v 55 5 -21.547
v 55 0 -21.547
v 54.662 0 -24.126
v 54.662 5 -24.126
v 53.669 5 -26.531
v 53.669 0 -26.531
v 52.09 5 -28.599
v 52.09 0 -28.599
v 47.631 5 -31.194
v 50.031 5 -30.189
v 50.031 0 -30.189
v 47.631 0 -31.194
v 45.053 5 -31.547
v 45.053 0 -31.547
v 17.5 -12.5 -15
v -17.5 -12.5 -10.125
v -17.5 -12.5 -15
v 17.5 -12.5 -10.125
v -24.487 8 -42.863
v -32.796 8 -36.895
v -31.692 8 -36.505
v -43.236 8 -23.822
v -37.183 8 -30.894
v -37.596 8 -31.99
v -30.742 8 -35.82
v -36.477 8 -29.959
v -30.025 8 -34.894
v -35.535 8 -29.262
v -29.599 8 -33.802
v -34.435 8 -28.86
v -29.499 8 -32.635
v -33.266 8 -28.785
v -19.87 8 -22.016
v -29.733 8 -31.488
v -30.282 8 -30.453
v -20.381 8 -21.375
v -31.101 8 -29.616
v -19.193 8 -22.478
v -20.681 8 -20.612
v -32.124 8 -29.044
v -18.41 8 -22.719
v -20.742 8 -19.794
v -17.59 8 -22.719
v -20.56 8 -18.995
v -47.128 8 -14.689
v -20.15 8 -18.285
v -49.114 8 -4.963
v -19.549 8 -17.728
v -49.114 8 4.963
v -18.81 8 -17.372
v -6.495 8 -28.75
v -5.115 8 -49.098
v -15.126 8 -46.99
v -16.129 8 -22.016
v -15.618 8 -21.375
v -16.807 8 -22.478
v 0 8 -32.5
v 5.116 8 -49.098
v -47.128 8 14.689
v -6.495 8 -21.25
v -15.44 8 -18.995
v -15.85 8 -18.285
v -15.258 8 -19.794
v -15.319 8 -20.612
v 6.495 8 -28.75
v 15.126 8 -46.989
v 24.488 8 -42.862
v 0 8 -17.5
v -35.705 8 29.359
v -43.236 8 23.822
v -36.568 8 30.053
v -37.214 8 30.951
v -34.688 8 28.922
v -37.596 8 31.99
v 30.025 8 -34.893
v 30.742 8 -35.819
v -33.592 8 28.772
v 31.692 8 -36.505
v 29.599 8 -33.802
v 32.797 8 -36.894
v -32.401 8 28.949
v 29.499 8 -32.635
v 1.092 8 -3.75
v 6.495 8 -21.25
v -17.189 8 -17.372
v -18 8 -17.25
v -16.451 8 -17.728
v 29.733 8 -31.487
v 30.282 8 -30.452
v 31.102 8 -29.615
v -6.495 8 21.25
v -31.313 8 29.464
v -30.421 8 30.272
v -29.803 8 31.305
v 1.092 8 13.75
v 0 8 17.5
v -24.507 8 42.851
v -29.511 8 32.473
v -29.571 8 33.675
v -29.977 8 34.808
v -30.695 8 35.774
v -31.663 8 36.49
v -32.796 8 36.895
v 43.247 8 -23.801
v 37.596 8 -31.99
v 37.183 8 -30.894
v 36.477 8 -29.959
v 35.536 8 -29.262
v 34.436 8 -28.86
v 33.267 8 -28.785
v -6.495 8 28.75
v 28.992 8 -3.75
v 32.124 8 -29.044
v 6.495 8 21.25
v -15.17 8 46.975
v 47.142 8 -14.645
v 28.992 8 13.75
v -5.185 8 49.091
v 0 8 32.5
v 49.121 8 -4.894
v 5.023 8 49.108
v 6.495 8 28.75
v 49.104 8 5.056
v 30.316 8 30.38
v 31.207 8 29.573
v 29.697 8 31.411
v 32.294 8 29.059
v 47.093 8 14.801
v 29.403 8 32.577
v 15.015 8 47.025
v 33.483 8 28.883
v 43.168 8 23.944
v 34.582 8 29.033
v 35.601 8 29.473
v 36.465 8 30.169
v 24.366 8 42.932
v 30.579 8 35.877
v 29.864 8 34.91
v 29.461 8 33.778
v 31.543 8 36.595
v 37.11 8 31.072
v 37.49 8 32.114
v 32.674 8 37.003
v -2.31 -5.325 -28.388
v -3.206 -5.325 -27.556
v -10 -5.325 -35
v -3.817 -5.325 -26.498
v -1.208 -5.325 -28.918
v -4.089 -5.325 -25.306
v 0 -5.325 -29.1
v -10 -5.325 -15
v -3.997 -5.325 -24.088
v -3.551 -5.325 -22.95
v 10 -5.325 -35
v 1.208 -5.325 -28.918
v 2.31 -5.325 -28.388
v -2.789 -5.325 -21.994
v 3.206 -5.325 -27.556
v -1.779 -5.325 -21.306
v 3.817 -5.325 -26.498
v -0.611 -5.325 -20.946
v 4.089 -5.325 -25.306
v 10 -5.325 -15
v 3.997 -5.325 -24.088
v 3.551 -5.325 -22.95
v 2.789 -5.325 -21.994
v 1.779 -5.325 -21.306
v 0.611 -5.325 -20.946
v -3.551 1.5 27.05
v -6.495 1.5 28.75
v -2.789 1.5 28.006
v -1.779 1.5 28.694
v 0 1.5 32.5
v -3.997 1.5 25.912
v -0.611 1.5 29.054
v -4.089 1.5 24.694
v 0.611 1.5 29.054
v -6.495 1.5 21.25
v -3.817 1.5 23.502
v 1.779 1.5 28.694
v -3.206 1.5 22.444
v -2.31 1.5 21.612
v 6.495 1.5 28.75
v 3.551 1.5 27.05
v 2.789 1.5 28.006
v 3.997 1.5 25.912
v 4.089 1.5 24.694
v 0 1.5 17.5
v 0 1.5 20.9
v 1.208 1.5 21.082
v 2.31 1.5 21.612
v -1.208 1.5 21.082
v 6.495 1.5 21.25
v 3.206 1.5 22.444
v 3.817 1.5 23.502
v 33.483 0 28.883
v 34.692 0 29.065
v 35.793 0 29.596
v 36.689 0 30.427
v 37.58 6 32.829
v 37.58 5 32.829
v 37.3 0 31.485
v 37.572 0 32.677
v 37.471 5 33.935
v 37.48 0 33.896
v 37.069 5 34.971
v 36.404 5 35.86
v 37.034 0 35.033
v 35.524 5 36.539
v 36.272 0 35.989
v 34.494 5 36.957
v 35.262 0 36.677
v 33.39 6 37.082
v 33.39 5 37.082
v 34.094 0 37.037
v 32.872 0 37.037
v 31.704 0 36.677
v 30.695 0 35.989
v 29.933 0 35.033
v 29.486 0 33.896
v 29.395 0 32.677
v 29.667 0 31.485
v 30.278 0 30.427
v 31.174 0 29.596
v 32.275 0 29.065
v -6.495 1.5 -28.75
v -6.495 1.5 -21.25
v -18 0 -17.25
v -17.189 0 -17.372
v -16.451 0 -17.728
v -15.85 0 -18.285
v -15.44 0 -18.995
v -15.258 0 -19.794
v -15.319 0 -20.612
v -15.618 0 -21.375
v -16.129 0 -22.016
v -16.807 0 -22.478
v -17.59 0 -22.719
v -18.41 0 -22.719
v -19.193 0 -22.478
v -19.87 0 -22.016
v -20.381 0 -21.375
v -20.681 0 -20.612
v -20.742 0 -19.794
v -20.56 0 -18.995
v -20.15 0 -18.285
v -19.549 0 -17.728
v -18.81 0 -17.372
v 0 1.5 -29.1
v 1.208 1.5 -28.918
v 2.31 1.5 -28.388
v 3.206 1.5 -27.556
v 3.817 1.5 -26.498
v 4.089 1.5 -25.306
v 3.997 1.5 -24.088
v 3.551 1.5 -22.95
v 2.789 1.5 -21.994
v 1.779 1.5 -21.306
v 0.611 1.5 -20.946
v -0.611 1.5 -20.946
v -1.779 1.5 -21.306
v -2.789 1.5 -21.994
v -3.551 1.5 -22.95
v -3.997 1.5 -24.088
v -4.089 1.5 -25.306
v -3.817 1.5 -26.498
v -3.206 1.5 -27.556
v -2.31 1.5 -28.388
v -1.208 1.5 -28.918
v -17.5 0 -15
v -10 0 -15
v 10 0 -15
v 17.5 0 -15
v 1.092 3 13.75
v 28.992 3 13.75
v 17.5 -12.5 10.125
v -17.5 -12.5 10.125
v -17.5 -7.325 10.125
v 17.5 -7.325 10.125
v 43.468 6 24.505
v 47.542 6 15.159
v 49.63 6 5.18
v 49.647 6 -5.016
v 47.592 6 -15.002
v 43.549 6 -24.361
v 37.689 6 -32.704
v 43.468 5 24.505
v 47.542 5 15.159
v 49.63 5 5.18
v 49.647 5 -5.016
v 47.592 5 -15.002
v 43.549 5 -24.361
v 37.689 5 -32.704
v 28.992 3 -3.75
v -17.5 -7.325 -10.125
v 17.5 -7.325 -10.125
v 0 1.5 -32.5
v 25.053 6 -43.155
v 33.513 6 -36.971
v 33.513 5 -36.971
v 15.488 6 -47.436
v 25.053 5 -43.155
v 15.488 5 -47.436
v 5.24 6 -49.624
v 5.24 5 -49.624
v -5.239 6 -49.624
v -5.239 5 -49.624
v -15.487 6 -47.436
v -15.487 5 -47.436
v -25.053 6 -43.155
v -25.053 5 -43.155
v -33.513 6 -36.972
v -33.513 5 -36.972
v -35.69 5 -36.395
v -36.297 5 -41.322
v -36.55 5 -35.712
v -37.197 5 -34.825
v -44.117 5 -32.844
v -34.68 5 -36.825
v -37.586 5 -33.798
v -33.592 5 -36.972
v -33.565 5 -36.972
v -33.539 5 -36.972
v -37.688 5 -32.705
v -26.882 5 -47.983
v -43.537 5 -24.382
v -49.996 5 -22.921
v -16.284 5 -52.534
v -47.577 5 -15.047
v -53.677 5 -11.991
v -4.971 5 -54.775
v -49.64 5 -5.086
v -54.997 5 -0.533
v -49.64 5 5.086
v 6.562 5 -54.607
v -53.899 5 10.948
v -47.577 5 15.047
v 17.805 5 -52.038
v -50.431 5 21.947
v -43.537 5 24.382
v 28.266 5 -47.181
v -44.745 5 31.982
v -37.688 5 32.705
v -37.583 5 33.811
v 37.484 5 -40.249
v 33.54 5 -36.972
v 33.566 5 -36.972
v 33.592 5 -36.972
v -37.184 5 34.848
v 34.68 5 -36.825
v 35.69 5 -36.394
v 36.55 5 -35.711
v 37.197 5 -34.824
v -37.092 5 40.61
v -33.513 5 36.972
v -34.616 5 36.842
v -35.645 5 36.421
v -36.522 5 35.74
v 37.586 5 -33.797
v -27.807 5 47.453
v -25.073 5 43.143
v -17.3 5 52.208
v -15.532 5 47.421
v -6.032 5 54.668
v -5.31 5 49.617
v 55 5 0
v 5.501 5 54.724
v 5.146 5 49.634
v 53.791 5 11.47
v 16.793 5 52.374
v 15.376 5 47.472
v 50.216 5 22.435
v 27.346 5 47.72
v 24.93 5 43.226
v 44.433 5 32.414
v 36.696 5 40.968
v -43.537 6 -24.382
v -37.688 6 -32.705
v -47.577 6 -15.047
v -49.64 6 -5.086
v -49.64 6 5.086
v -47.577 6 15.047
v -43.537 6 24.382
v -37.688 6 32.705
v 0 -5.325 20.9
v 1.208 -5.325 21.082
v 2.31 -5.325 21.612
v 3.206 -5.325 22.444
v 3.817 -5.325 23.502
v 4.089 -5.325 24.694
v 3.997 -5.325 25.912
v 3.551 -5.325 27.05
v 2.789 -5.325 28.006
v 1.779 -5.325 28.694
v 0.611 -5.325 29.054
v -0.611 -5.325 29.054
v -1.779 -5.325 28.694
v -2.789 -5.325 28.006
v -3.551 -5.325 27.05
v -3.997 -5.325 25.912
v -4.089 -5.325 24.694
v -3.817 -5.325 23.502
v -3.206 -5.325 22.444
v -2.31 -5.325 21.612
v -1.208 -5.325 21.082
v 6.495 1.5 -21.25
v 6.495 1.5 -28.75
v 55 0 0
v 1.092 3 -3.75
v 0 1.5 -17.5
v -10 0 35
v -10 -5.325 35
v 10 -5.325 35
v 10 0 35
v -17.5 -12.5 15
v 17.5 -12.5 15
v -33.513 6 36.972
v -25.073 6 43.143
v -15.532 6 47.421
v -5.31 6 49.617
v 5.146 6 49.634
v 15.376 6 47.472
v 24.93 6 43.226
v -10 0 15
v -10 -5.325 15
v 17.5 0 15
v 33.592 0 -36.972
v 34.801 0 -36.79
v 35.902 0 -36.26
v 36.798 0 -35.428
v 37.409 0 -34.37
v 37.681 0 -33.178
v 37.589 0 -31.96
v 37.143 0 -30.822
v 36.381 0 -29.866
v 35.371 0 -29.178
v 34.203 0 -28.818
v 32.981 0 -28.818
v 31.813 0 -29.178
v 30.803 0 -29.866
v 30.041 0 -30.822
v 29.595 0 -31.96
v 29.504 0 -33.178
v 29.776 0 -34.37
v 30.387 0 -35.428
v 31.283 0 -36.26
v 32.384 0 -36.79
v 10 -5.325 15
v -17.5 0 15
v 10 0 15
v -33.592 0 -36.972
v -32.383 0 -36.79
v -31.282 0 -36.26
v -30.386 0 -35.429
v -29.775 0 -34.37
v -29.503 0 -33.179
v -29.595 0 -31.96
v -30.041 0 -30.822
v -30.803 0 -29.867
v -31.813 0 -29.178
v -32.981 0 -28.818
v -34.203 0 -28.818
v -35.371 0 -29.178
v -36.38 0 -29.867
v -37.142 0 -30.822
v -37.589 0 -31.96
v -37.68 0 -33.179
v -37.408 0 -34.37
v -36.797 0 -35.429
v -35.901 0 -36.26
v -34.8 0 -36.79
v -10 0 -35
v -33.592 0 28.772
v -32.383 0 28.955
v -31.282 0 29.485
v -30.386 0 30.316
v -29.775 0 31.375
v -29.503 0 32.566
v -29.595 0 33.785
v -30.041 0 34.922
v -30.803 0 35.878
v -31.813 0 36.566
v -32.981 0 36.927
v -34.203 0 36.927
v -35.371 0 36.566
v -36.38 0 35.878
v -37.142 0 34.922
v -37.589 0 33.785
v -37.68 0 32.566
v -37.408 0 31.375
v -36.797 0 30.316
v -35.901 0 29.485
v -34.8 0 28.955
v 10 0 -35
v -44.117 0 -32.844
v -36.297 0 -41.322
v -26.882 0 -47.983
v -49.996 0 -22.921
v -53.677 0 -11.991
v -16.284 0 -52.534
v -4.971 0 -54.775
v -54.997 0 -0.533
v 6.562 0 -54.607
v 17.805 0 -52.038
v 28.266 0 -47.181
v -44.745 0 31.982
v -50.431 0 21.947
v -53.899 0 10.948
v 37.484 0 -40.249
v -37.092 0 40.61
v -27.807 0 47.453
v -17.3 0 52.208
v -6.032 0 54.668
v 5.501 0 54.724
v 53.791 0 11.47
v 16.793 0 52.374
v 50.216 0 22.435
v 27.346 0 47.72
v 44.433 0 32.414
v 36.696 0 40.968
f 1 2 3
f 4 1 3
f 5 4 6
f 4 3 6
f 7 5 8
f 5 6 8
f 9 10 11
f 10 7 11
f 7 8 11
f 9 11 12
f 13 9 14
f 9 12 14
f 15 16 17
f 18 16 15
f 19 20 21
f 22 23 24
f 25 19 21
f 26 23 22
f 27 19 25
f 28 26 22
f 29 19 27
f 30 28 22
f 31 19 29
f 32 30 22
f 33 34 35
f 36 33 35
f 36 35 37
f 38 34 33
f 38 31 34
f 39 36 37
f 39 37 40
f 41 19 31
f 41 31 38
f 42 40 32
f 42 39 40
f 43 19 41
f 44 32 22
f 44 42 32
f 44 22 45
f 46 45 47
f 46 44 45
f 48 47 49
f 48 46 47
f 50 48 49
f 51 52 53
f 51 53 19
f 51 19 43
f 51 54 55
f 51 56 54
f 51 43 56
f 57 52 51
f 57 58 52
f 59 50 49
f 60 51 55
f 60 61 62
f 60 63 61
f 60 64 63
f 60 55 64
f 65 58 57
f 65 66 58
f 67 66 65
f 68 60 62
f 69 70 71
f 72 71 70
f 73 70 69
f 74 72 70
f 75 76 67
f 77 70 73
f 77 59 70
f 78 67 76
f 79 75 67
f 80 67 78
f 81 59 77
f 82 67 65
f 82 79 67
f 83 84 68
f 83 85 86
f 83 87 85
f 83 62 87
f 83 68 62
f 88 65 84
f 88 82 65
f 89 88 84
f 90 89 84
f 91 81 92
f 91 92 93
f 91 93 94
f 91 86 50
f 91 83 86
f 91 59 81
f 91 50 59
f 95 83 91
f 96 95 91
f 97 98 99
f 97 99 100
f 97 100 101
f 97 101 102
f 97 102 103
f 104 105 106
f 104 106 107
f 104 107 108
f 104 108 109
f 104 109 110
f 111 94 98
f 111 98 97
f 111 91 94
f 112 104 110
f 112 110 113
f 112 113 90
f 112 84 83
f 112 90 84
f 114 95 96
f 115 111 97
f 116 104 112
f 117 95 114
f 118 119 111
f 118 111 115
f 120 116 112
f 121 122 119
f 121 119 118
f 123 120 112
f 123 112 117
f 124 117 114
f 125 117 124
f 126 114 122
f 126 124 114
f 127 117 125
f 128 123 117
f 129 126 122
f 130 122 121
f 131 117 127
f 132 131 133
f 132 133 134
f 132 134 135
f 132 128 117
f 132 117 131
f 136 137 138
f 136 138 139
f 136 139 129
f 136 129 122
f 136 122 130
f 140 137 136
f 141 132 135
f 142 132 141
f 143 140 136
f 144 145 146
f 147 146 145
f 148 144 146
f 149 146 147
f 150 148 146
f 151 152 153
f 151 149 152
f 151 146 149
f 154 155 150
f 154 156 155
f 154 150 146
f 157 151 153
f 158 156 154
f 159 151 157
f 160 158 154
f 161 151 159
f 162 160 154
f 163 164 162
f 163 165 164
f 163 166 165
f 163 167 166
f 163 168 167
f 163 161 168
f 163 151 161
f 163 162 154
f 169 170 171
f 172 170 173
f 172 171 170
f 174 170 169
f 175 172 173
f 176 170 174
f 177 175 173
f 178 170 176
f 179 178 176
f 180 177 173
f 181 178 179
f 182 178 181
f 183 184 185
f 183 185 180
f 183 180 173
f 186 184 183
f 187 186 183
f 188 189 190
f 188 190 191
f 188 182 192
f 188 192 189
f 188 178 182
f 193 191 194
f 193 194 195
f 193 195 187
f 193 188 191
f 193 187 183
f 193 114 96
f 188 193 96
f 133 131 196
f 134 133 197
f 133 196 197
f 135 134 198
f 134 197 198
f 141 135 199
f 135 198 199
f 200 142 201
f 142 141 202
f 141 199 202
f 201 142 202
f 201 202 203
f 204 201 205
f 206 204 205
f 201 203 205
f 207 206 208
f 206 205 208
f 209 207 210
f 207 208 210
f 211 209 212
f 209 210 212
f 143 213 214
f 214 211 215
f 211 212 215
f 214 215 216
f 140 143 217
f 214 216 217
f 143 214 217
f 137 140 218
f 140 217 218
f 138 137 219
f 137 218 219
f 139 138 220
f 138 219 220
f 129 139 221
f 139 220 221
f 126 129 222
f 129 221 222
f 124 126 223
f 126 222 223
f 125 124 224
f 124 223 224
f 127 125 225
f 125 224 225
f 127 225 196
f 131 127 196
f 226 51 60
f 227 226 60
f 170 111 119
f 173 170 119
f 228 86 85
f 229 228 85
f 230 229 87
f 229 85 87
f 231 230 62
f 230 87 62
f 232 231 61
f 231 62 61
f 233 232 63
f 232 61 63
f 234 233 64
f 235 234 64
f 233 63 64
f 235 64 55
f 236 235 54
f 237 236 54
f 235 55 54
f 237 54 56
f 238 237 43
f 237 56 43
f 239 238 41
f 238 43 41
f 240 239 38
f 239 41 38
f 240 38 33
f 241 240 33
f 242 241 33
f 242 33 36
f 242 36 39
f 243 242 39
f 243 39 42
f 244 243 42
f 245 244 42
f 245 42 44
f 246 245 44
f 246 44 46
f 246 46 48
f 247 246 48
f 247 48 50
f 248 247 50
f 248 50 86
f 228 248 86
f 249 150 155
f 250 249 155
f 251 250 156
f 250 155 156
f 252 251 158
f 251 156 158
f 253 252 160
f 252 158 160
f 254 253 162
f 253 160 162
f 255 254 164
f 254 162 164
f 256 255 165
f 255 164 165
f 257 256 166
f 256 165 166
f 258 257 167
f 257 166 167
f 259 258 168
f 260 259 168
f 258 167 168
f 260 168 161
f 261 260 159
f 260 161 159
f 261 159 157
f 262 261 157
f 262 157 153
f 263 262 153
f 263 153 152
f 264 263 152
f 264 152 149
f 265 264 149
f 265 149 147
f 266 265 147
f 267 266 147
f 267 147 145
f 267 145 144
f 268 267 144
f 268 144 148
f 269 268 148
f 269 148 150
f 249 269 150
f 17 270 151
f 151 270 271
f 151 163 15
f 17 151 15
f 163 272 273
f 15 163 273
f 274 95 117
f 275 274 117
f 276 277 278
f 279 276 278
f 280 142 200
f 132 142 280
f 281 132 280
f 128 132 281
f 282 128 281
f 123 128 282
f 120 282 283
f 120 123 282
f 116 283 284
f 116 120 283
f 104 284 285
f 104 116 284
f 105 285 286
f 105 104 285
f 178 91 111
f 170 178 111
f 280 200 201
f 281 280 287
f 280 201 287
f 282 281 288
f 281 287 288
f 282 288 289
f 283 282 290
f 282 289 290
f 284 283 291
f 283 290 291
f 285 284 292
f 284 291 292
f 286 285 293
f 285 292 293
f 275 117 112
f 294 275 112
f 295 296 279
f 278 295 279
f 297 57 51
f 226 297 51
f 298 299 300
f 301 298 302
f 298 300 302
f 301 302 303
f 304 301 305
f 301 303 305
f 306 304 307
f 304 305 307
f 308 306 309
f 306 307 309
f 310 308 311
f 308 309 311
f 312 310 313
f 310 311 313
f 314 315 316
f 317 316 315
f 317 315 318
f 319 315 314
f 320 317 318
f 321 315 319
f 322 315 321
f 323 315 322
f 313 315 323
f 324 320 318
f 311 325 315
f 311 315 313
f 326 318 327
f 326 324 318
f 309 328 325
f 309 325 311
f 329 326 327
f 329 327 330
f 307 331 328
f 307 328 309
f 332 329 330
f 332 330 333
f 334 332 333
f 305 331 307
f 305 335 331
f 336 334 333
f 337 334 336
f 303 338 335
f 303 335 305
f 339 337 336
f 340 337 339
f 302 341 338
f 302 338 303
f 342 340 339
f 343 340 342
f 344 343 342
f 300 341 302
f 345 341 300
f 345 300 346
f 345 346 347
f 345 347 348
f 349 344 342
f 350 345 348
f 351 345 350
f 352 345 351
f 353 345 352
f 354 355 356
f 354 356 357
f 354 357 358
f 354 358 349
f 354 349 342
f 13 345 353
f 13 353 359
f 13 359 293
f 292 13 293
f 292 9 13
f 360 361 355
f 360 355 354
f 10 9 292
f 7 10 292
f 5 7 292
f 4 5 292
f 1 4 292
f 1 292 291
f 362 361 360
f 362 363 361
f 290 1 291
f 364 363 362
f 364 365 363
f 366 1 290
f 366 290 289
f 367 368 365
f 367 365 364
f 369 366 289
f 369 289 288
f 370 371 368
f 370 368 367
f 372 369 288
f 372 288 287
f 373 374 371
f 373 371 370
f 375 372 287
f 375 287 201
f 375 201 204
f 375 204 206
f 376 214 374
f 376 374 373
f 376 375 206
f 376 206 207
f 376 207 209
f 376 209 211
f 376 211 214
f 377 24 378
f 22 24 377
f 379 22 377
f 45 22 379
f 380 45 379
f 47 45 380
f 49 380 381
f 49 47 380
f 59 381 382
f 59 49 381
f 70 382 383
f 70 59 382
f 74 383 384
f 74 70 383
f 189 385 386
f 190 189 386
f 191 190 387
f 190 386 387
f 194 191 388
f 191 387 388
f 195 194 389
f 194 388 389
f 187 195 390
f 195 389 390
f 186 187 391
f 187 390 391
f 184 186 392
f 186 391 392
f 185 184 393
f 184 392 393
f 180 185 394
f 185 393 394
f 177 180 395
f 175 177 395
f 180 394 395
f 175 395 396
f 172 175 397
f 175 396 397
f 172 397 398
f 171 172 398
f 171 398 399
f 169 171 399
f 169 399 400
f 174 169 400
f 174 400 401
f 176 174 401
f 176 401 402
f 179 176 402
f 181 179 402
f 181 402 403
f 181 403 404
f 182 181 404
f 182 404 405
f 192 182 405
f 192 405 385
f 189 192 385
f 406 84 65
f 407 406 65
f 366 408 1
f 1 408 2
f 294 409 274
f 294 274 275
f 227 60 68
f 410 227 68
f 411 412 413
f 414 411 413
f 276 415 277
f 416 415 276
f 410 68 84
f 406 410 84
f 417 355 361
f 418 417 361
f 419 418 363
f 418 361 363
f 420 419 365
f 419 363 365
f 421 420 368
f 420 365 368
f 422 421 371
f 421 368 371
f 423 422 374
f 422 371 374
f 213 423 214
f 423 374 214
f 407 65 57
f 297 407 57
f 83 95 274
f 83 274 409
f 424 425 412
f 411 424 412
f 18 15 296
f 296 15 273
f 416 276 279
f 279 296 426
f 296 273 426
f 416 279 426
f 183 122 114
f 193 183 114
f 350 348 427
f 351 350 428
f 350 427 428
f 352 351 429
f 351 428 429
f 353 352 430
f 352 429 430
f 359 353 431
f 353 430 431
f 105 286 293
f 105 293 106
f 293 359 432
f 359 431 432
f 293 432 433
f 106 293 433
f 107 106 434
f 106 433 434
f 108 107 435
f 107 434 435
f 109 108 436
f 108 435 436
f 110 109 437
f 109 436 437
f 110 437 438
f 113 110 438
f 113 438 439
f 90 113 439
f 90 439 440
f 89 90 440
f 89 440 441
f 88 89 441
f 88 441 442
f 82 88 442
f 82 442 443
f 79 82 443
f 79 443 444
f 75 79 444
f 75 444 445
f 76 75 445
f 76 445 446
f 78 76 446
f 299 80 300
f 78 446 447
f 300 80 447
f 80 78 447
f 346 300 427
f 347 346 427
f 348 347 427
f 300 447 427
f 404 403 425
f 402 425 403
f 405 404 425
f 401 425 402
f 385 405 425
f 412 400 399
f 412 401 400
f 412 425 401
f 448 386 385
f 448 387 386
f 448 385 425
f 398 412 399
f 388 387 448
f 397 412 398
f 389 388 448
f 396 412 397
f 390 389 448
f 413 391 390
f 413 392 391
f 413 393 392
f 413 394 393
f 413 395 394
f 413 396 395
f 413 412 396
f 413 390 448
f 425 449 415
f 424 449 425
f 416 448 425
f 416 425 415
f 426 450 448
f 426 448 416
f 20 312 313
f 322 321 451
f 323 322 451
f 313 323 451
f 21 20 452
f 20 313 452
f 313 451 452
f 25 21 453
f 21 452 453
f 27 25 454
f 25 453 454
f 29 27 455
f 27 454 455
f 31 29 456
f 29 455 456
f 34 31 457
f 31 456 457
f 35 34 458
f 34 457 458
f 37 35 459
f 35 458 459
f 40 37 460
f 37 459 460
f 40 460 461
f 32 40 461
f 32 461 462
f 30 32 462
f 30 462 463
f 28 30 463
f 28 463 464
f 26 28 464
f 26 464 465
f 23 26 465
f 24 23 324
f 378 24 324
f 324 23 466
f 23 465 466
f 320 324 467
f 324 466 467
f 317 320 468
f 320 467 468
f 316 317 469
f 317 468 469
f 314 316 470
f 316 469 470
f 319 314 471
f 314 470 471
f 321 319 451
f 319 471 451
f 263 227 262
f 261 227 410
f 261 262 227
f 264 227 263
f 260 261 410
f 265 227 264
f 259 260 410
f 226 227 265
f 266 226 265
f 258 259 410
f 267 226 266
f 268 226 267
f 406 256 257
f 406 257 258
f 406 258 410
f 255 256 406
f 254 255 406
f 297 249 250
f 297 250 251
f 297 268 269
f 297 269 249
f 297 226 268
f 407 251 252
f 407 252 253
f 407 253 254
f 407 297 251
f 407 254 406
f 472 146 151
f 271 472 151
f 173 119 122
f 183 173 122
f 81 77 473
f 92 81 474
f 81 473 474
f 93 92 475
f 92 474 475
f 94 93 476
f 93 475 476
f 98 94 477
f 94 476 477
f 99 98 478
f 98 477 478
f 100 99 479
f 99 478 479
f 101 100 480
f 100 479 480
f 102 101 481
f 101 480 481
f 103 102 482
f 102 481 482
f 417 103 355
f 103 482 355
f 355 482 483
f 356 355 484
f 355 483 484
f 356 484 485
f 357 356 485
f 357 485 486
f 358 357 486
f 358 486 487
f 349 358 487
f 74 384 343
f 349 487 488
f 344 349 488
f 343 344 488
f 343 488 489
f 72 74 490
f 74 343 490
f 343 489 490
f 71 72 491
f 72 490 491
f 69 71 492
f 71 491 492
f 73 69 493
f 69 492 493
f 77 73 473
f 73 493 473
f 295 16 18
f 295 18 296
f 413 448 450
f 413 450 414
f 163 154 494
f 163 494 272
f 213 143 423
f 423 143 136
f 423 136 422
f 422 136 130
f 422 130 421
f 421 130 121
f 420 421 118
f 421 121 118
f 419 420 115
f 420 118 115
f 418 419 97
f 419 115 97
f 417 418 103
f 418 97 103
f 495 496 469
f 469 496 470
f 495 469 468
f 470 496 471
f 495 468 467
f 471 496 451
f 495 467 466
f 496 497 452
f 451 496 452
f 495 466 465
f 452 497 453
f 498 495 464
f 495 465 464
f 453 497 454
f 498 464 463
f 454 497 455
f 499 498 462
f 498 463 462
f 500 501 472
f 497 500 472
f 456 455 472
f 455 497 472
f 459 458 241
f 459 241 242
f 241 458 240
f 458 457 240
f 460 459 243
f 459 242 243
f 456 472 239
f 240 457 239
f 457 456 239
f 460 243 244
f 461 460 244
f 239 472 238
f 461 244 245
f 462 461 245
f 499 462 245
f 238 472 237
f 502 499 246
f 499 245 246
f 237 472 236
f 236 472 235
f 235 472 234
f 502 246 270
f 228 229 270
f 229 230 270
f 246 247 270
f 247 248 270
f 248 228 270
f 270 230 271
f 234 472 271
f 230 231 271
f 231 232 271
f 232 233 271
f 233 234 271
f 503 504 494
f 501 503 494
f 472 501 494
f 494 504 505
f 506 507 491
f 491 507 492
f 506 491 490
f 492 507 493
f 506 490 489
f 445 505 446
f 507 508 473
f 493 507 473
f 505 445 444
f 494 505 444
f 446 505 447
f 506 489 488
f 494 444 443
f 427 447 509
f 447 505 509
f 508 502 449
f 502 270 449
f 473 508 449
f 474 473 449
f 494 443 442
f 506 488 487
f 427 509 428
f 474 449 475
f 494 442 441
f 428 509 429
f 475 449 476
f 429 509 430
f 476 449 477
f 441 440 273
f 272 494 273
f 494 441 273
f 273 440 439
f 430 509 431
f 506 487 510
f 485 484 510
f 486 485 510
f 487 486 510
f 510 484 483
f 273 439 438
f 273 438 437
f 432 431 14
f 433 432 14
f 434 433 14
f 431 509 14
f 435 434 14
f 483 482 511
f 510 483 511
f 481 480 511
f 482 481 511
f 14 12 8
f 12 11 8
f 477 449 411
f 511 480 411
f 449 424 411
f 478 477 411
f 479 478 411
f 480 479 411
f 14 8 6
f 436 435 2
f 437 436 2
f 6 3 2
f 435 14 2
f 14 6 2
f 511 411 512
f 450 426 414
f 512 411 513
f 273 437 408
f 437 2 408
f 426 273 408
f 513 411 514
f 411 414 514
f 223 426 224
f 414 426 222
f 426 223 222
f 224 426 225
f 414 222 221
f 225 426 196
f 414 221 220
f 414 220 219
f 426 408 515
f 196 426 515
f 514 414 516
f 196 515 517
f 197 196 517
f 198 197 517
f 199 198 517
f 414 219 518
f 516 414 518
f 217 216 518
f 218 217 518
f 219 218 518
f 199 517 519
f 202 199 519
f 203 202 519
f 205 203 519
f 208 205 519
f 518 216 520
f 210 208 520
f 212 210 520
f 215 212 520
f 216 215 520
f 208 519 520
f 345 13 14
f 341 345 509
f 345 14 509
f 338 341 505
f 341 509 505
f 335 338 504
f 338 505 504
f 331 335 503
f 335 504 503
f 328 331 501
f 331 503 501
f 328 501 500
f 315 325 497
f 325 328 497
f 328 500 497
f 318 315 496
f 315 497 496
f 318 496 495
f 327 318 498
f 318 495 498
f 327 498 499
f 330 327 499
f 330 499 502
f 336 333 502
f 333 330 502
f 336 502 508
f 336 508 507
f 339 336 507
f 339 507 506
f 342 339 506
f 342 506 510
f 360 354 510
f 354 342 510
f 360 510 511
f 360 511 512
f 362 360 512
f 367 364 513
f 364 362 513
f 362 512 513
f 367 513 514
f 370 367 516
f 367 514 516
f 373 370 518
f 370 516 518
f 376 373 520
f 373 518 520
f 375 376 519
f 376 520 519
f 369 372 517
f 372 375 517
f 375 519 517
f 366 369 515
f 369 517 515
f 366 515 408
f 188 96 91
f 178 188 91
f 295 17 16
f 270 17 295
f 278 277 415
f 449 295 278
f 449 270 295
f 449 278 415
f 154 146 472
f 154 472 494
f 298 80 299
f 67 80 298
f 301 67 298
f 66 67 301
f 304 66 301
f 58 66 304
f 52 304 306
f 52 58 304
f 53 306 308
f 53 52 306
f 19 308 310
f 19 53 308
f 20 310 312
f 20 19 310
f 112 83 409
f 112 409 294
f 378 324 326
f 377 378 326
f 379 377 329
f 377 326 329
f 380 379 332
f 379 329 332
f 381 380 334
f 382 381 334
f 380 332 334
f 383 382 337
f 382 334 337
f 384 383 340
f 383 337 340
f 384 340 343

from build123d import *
from OCP.BRepFilletAPI import BRepFilletAPI_MakeChamfer

# Parameters (mm, degrees)
SKETCH_1_R          = 55
EXTRUDE_1_DEPTH     = 5
SKETCH_2_R          = 49.9
EXTRUDE_2_DEPTH     = 3
SKETCH_3_W          = 35
SKETCH_3_H          = 30
EXTRUDE_3_DEPTH     = 25
SKETCH_5_R          = 4.1
CUT_EXTRUDE_2_DEPTH = 82.700673192
SKETCH_6_R          = 2.75
CUT_EXTRUDE_3_DEPTH = 85.492603227
BOSS_EXTRUDE1_DEPTH = 5
FILLET1_R           = 10
SKETCH2_W           = 20.25
SKETCH2_H           = 10.35
CUT_EXTRUDE1_DEPTH  = 95.372930441
SKETCH3_W           = 27.9
SKETCH3_H           = 17.5
CUT_EXTRUDE2_DEPTH  = 5
CHAMFER1_SIZE       = 2
CHAMFER1_SIZE2      = 0.535898385
SKETCH4_W           = 35
SKETCH4_H           = 30
CUT_EXTRUDE3_DEPTH  = 12.5
BOSS_EXTRUDE2_START = -2
SKETCH5_W           = 20
SKETCH5_H           = 70
BOSS_EXTRUDE2_DEPTH = 5.325
SKETCH6_R           = 4.1
CUT_EXTRUDE4_DEPTH  = 79.914863161
CUT_EXTRUDE5_DEPTH  = 6.5


with BuildPart() as part:
    # Эскиз1 → Бобышка-Вытянуть1 (new body)
    with BuildSketch(Plane(origin=(0, 0, 0), x_dir=(1, 0, 0), z_dir=(0, 1, 0))):
        with Locations(Location((0, 0, 0), (0, 0, 270))):
            Circle(SKETCH_1_R)
    extrude(amount=EXTRUDE_1_DEPTH)

    # Эскиз2 → Бобышка-Вытянуть2 (add)
    with BuildSketch(Plane(origin=(0, 5, 0), x_dir=(1, 0, 0), z_dir=(0, 1, 0))):
        with Locations(Location((0, 0, 0), (0, 0, 270))):
            Circle(SKETCH_2_R)
    extrude(amount=EXTRUDE_2_DEPTH)

    # Эскиз3 → Бобышка-Вытянуть3 (add)
    with BuildSketch(Plane.XZ):
        Rectangle(SKETCH_3_W, SKETCH_3_H)
    extrude(amount=EXTRUDE_3_DEPTH)

    # Эскиз5 → Вырез-Вытянуть2 (cut, through all)
    with BuildSketch(Plane.XZ):
        with Locations(Location((33.592198598, -32.871936263, 0), (0, 0, 270))):
            Circle(SKETCH_5_R)
        with Locations(Location((-33.591727056, -32.872418125, 0), (0, 0, 270))):
            Circle(SKETCH_5_R)
        with Locations(Location((-33.591727056, 32.872418125, 0), (0, 0, 270))):
            Circle(SKETCH_5_R)
        with Locations(Location((33.483215177, 32.983215177, 0), (0, 0, 270))):
            Circle(SKETCH_5_R)
    extrude(amount=-CUT_EXTRUDE_2_DEPTH, mode=Mode.SUBTRACT)

    # Эскиз6 → Вырез-Вытянуть3 (cut, through all)
    with BuildSketch(Plane(origin=(0, 8, 0), x_dir=(1, 0, 0), z_dir=(0, 1, 0))):
        with Locations(Location((-17.999856554, 19.999999999, 0), (0, 0, 270))):
            Circle(SKETCH_6_R)
    extrude(amount=-CUT_EXTRUDE_3_DEPTH, mode=Mode.SUBTRACT)

    # Sketch1 → Boss-Extrude1 (add)
    with BuildSketch(Plane.XZ):
        with BuildLine():
            Line((55, 0), (55, -31.546703999))
            Line((55, -31.546703999), (45.053362436, -31.546703999))
            ThreePointArc((45.053362436, -31.546703999), (52.454432291, -16.538818973), (55, 0))
        make_face()
    extrude(amount=-BOSS_EXTRUDE1_DEPTH)

    # Fillet1
    # the kernel refuses this fillet: 10 mm, written as the material it takes off along each edge
    with BuildSketch(Plane(origin=(55, -25, -31.546703999), x_dir=(0, 0, 1), z_dir=(0, 1, 0))) as fillet1_piece_1_section:
        with BuildLine():
            CenterArc((FILLET1_R, -FILLET1_R), FILLET1_R, 90, 90)
            Line((0, -FILLET1_R), (0, 0))
            Line((0, 0), (FILLET1_R, 0))
        make_face()
    fillet1_piece_1 = extrude(amount=55, mode=Mode.PRIVATE)
    fillet1_piece_1 = fillet1_piece_1 - Plane(origin=(0, 2.5, 0), x_dir=(0, 0, 1), z_dir=(0, -1, 0)) * Cylinder(55, 150, mode=Mode.PRIVATE)
    add(fillet1_piece_1, mode=Mode.SUBTRACT)

    # Sketch2 → Cut-Extrude1 (cut, through all)
    with BuildSketch(Plane.ZY.offset(17.5)):
        with Locations((0, -12.5)):
            Rectangle(SKETCH2_W, SKETCH2_H)
    extrude(amount=-CUT_EXTRUDE1_DEPTH, mode=Mode.SUBTRACT)

    # Sketch3 → Cut-Extrude2 (cut)
    with BuildSketch(Plane(origin=(0, 8, 0), x_dir=(1, 0, 0), z_dir=(0, 1, 0))):
        with Locations((15.042136476, -5)):
            Rectangle(SKETCH3_W, SKETCH3_H)
    extrude(amount=-CUT_EXTRUDE2_DEPTH, mode=Mode.SUBTRACT)

    # Chamfer1: one chamfer whose edges measure the first distance from different faces: ONE call of the kernel's chamfer builder (chamfer() names one face for all edges)
    chamfer1_edges_1 = [part.edges().sort_by_distance(p)[0] for p in [
        (0.000357897, 8, -49.899999999),
    ]]
    chamfer1_side_1 = [part.faces().sort_by_distance(p)[0] for p in [
        (0.000357897, 6.5, -49.899999999),
    ]]
    chamfer1_edges_2 = [part.edges().sort_by_distance(p)[0] for p in [
        (-49.9, 8, 0),
    ]]
    chamfer1_side_2 = [part.faces().sort_by_distance(p)[0] for p in [
        (-49.9, 6.5, 0),
    ]]
    chamfer1_edges_3 = [part.edges().sort_by_distance(p)[0] for p in [
        (-0.08242255, 8, 49.899931929),
    ]]
    chamfer1_side_3 = [part.faces().sort_by_distance(p)[0] for p in [
        (-0.08242255, 6.5, 49.899931929),
    ]]
    chamfer1_edges_4 = [part.edges().sort_by_distance(p)[0] for p in [
        (49.899931657, 8, 0.082587101),
    ]]
    chamfer1_side_4 = [part.faces().sort_by_distance(p)[0] for p in [
        (49.899931657, 6.5, 0.082587101),
    ]]
    chamfer1 = BRepFilletAPI_MakeChamfer(part.part.solid().wrapped)
    for e in chamfer1_edges_1:
        chamfer1.Add(CHAMFER1_SIZE, CHAMFER1_SIZE2, e.wrapped, chamfer1_side_1[0].wrapped)  # the first distance lies on this face
    for e in chamfer1_edges_2:
        chamfer1.Add(CHAMFER1_SIZE, CHAMFER1_SIZE2, e.wrapped, chamfer1_side_2[0].wrapped)  # the first distance lies on this face
    for e in chamfer1_edges_3:
        chamfer1.Add(CHAMFER1_SIZE, CHAMFER1_SIZE2, e.wrapped, chamfer1_side_3[0].wrapped)  # the first distance lies on this face
    for e in chamfer1_edges_4:
        chamfer1.Add(CHAMFER1_SIZE, CHAMFER1_SIZE2, e.wrapped, chamfer1_side_4[0].wrapped)  # the first distance lies on this face
    add(Compound.cast(chamfer1.Shape()), mode=Mode.REPLACE)

    # Sketch4 → Cut-Extrude3 (cut)
    with BuildSketch(Plane.XZ.offset(25)):
        Rectangle(SKETCH4_W, SKETCH4_H)
    extrude(amount=-CUT_EXTRUDE3_DEPTH, mode=Mode.SUBTRACT)

    # Sketch5 → Boss-Extrude2 (add)
    with BuildSketch(Plane.XZ.offset(7.325).offset(BOSS_EXTRUDE2_START)):
        Rectangle(SKETCH5_W, SKETCH5_H)
    extrude(amount=-BOSS_EXTRUDE2_DEPTH)

    # Sketch6 → Cut-Extrude4 (cut, through all)
    with BuildSketch(Plane.XZ.offset(5.325)):
        with Locations(Location((0, 25, 0), (0, 0, 270))):
            Circle(SKETCH6_R)
        with Locations(Location((0, -25, 0), (0, 0, 270))):
            Circle(SKETCH6_R)
    extrude(amount=-CUT_EXTRUDE4_DEPTH, mode=Mode.SUBTRACT)

    # Sketch7 → Cut-Extrude5 (cut)
    with BuildSketch(Plane(origin=(0, 8, 0), x_dir=(1, 0, 0), z_dir=(0, 1, 0))):
        Polygon((0, -32.5), (6.495190528, -28.75), (6.495190528, -21.25), (0, -17.5), (-6.495190528, -21.25), (-6.495190528, -28.75), align=None)
        Polygon((0, 17.5), (6.495190528, 21.25), (6.495190528, 28.75), (0, 32.5), (-6.495190528, 28.75), (-6.495190528, 21.25), align=None)
    extrude(amount=-CUT_EXTRUDE5_DEPTH, mode=Mode.SUBTRACT)


solid = part.part
